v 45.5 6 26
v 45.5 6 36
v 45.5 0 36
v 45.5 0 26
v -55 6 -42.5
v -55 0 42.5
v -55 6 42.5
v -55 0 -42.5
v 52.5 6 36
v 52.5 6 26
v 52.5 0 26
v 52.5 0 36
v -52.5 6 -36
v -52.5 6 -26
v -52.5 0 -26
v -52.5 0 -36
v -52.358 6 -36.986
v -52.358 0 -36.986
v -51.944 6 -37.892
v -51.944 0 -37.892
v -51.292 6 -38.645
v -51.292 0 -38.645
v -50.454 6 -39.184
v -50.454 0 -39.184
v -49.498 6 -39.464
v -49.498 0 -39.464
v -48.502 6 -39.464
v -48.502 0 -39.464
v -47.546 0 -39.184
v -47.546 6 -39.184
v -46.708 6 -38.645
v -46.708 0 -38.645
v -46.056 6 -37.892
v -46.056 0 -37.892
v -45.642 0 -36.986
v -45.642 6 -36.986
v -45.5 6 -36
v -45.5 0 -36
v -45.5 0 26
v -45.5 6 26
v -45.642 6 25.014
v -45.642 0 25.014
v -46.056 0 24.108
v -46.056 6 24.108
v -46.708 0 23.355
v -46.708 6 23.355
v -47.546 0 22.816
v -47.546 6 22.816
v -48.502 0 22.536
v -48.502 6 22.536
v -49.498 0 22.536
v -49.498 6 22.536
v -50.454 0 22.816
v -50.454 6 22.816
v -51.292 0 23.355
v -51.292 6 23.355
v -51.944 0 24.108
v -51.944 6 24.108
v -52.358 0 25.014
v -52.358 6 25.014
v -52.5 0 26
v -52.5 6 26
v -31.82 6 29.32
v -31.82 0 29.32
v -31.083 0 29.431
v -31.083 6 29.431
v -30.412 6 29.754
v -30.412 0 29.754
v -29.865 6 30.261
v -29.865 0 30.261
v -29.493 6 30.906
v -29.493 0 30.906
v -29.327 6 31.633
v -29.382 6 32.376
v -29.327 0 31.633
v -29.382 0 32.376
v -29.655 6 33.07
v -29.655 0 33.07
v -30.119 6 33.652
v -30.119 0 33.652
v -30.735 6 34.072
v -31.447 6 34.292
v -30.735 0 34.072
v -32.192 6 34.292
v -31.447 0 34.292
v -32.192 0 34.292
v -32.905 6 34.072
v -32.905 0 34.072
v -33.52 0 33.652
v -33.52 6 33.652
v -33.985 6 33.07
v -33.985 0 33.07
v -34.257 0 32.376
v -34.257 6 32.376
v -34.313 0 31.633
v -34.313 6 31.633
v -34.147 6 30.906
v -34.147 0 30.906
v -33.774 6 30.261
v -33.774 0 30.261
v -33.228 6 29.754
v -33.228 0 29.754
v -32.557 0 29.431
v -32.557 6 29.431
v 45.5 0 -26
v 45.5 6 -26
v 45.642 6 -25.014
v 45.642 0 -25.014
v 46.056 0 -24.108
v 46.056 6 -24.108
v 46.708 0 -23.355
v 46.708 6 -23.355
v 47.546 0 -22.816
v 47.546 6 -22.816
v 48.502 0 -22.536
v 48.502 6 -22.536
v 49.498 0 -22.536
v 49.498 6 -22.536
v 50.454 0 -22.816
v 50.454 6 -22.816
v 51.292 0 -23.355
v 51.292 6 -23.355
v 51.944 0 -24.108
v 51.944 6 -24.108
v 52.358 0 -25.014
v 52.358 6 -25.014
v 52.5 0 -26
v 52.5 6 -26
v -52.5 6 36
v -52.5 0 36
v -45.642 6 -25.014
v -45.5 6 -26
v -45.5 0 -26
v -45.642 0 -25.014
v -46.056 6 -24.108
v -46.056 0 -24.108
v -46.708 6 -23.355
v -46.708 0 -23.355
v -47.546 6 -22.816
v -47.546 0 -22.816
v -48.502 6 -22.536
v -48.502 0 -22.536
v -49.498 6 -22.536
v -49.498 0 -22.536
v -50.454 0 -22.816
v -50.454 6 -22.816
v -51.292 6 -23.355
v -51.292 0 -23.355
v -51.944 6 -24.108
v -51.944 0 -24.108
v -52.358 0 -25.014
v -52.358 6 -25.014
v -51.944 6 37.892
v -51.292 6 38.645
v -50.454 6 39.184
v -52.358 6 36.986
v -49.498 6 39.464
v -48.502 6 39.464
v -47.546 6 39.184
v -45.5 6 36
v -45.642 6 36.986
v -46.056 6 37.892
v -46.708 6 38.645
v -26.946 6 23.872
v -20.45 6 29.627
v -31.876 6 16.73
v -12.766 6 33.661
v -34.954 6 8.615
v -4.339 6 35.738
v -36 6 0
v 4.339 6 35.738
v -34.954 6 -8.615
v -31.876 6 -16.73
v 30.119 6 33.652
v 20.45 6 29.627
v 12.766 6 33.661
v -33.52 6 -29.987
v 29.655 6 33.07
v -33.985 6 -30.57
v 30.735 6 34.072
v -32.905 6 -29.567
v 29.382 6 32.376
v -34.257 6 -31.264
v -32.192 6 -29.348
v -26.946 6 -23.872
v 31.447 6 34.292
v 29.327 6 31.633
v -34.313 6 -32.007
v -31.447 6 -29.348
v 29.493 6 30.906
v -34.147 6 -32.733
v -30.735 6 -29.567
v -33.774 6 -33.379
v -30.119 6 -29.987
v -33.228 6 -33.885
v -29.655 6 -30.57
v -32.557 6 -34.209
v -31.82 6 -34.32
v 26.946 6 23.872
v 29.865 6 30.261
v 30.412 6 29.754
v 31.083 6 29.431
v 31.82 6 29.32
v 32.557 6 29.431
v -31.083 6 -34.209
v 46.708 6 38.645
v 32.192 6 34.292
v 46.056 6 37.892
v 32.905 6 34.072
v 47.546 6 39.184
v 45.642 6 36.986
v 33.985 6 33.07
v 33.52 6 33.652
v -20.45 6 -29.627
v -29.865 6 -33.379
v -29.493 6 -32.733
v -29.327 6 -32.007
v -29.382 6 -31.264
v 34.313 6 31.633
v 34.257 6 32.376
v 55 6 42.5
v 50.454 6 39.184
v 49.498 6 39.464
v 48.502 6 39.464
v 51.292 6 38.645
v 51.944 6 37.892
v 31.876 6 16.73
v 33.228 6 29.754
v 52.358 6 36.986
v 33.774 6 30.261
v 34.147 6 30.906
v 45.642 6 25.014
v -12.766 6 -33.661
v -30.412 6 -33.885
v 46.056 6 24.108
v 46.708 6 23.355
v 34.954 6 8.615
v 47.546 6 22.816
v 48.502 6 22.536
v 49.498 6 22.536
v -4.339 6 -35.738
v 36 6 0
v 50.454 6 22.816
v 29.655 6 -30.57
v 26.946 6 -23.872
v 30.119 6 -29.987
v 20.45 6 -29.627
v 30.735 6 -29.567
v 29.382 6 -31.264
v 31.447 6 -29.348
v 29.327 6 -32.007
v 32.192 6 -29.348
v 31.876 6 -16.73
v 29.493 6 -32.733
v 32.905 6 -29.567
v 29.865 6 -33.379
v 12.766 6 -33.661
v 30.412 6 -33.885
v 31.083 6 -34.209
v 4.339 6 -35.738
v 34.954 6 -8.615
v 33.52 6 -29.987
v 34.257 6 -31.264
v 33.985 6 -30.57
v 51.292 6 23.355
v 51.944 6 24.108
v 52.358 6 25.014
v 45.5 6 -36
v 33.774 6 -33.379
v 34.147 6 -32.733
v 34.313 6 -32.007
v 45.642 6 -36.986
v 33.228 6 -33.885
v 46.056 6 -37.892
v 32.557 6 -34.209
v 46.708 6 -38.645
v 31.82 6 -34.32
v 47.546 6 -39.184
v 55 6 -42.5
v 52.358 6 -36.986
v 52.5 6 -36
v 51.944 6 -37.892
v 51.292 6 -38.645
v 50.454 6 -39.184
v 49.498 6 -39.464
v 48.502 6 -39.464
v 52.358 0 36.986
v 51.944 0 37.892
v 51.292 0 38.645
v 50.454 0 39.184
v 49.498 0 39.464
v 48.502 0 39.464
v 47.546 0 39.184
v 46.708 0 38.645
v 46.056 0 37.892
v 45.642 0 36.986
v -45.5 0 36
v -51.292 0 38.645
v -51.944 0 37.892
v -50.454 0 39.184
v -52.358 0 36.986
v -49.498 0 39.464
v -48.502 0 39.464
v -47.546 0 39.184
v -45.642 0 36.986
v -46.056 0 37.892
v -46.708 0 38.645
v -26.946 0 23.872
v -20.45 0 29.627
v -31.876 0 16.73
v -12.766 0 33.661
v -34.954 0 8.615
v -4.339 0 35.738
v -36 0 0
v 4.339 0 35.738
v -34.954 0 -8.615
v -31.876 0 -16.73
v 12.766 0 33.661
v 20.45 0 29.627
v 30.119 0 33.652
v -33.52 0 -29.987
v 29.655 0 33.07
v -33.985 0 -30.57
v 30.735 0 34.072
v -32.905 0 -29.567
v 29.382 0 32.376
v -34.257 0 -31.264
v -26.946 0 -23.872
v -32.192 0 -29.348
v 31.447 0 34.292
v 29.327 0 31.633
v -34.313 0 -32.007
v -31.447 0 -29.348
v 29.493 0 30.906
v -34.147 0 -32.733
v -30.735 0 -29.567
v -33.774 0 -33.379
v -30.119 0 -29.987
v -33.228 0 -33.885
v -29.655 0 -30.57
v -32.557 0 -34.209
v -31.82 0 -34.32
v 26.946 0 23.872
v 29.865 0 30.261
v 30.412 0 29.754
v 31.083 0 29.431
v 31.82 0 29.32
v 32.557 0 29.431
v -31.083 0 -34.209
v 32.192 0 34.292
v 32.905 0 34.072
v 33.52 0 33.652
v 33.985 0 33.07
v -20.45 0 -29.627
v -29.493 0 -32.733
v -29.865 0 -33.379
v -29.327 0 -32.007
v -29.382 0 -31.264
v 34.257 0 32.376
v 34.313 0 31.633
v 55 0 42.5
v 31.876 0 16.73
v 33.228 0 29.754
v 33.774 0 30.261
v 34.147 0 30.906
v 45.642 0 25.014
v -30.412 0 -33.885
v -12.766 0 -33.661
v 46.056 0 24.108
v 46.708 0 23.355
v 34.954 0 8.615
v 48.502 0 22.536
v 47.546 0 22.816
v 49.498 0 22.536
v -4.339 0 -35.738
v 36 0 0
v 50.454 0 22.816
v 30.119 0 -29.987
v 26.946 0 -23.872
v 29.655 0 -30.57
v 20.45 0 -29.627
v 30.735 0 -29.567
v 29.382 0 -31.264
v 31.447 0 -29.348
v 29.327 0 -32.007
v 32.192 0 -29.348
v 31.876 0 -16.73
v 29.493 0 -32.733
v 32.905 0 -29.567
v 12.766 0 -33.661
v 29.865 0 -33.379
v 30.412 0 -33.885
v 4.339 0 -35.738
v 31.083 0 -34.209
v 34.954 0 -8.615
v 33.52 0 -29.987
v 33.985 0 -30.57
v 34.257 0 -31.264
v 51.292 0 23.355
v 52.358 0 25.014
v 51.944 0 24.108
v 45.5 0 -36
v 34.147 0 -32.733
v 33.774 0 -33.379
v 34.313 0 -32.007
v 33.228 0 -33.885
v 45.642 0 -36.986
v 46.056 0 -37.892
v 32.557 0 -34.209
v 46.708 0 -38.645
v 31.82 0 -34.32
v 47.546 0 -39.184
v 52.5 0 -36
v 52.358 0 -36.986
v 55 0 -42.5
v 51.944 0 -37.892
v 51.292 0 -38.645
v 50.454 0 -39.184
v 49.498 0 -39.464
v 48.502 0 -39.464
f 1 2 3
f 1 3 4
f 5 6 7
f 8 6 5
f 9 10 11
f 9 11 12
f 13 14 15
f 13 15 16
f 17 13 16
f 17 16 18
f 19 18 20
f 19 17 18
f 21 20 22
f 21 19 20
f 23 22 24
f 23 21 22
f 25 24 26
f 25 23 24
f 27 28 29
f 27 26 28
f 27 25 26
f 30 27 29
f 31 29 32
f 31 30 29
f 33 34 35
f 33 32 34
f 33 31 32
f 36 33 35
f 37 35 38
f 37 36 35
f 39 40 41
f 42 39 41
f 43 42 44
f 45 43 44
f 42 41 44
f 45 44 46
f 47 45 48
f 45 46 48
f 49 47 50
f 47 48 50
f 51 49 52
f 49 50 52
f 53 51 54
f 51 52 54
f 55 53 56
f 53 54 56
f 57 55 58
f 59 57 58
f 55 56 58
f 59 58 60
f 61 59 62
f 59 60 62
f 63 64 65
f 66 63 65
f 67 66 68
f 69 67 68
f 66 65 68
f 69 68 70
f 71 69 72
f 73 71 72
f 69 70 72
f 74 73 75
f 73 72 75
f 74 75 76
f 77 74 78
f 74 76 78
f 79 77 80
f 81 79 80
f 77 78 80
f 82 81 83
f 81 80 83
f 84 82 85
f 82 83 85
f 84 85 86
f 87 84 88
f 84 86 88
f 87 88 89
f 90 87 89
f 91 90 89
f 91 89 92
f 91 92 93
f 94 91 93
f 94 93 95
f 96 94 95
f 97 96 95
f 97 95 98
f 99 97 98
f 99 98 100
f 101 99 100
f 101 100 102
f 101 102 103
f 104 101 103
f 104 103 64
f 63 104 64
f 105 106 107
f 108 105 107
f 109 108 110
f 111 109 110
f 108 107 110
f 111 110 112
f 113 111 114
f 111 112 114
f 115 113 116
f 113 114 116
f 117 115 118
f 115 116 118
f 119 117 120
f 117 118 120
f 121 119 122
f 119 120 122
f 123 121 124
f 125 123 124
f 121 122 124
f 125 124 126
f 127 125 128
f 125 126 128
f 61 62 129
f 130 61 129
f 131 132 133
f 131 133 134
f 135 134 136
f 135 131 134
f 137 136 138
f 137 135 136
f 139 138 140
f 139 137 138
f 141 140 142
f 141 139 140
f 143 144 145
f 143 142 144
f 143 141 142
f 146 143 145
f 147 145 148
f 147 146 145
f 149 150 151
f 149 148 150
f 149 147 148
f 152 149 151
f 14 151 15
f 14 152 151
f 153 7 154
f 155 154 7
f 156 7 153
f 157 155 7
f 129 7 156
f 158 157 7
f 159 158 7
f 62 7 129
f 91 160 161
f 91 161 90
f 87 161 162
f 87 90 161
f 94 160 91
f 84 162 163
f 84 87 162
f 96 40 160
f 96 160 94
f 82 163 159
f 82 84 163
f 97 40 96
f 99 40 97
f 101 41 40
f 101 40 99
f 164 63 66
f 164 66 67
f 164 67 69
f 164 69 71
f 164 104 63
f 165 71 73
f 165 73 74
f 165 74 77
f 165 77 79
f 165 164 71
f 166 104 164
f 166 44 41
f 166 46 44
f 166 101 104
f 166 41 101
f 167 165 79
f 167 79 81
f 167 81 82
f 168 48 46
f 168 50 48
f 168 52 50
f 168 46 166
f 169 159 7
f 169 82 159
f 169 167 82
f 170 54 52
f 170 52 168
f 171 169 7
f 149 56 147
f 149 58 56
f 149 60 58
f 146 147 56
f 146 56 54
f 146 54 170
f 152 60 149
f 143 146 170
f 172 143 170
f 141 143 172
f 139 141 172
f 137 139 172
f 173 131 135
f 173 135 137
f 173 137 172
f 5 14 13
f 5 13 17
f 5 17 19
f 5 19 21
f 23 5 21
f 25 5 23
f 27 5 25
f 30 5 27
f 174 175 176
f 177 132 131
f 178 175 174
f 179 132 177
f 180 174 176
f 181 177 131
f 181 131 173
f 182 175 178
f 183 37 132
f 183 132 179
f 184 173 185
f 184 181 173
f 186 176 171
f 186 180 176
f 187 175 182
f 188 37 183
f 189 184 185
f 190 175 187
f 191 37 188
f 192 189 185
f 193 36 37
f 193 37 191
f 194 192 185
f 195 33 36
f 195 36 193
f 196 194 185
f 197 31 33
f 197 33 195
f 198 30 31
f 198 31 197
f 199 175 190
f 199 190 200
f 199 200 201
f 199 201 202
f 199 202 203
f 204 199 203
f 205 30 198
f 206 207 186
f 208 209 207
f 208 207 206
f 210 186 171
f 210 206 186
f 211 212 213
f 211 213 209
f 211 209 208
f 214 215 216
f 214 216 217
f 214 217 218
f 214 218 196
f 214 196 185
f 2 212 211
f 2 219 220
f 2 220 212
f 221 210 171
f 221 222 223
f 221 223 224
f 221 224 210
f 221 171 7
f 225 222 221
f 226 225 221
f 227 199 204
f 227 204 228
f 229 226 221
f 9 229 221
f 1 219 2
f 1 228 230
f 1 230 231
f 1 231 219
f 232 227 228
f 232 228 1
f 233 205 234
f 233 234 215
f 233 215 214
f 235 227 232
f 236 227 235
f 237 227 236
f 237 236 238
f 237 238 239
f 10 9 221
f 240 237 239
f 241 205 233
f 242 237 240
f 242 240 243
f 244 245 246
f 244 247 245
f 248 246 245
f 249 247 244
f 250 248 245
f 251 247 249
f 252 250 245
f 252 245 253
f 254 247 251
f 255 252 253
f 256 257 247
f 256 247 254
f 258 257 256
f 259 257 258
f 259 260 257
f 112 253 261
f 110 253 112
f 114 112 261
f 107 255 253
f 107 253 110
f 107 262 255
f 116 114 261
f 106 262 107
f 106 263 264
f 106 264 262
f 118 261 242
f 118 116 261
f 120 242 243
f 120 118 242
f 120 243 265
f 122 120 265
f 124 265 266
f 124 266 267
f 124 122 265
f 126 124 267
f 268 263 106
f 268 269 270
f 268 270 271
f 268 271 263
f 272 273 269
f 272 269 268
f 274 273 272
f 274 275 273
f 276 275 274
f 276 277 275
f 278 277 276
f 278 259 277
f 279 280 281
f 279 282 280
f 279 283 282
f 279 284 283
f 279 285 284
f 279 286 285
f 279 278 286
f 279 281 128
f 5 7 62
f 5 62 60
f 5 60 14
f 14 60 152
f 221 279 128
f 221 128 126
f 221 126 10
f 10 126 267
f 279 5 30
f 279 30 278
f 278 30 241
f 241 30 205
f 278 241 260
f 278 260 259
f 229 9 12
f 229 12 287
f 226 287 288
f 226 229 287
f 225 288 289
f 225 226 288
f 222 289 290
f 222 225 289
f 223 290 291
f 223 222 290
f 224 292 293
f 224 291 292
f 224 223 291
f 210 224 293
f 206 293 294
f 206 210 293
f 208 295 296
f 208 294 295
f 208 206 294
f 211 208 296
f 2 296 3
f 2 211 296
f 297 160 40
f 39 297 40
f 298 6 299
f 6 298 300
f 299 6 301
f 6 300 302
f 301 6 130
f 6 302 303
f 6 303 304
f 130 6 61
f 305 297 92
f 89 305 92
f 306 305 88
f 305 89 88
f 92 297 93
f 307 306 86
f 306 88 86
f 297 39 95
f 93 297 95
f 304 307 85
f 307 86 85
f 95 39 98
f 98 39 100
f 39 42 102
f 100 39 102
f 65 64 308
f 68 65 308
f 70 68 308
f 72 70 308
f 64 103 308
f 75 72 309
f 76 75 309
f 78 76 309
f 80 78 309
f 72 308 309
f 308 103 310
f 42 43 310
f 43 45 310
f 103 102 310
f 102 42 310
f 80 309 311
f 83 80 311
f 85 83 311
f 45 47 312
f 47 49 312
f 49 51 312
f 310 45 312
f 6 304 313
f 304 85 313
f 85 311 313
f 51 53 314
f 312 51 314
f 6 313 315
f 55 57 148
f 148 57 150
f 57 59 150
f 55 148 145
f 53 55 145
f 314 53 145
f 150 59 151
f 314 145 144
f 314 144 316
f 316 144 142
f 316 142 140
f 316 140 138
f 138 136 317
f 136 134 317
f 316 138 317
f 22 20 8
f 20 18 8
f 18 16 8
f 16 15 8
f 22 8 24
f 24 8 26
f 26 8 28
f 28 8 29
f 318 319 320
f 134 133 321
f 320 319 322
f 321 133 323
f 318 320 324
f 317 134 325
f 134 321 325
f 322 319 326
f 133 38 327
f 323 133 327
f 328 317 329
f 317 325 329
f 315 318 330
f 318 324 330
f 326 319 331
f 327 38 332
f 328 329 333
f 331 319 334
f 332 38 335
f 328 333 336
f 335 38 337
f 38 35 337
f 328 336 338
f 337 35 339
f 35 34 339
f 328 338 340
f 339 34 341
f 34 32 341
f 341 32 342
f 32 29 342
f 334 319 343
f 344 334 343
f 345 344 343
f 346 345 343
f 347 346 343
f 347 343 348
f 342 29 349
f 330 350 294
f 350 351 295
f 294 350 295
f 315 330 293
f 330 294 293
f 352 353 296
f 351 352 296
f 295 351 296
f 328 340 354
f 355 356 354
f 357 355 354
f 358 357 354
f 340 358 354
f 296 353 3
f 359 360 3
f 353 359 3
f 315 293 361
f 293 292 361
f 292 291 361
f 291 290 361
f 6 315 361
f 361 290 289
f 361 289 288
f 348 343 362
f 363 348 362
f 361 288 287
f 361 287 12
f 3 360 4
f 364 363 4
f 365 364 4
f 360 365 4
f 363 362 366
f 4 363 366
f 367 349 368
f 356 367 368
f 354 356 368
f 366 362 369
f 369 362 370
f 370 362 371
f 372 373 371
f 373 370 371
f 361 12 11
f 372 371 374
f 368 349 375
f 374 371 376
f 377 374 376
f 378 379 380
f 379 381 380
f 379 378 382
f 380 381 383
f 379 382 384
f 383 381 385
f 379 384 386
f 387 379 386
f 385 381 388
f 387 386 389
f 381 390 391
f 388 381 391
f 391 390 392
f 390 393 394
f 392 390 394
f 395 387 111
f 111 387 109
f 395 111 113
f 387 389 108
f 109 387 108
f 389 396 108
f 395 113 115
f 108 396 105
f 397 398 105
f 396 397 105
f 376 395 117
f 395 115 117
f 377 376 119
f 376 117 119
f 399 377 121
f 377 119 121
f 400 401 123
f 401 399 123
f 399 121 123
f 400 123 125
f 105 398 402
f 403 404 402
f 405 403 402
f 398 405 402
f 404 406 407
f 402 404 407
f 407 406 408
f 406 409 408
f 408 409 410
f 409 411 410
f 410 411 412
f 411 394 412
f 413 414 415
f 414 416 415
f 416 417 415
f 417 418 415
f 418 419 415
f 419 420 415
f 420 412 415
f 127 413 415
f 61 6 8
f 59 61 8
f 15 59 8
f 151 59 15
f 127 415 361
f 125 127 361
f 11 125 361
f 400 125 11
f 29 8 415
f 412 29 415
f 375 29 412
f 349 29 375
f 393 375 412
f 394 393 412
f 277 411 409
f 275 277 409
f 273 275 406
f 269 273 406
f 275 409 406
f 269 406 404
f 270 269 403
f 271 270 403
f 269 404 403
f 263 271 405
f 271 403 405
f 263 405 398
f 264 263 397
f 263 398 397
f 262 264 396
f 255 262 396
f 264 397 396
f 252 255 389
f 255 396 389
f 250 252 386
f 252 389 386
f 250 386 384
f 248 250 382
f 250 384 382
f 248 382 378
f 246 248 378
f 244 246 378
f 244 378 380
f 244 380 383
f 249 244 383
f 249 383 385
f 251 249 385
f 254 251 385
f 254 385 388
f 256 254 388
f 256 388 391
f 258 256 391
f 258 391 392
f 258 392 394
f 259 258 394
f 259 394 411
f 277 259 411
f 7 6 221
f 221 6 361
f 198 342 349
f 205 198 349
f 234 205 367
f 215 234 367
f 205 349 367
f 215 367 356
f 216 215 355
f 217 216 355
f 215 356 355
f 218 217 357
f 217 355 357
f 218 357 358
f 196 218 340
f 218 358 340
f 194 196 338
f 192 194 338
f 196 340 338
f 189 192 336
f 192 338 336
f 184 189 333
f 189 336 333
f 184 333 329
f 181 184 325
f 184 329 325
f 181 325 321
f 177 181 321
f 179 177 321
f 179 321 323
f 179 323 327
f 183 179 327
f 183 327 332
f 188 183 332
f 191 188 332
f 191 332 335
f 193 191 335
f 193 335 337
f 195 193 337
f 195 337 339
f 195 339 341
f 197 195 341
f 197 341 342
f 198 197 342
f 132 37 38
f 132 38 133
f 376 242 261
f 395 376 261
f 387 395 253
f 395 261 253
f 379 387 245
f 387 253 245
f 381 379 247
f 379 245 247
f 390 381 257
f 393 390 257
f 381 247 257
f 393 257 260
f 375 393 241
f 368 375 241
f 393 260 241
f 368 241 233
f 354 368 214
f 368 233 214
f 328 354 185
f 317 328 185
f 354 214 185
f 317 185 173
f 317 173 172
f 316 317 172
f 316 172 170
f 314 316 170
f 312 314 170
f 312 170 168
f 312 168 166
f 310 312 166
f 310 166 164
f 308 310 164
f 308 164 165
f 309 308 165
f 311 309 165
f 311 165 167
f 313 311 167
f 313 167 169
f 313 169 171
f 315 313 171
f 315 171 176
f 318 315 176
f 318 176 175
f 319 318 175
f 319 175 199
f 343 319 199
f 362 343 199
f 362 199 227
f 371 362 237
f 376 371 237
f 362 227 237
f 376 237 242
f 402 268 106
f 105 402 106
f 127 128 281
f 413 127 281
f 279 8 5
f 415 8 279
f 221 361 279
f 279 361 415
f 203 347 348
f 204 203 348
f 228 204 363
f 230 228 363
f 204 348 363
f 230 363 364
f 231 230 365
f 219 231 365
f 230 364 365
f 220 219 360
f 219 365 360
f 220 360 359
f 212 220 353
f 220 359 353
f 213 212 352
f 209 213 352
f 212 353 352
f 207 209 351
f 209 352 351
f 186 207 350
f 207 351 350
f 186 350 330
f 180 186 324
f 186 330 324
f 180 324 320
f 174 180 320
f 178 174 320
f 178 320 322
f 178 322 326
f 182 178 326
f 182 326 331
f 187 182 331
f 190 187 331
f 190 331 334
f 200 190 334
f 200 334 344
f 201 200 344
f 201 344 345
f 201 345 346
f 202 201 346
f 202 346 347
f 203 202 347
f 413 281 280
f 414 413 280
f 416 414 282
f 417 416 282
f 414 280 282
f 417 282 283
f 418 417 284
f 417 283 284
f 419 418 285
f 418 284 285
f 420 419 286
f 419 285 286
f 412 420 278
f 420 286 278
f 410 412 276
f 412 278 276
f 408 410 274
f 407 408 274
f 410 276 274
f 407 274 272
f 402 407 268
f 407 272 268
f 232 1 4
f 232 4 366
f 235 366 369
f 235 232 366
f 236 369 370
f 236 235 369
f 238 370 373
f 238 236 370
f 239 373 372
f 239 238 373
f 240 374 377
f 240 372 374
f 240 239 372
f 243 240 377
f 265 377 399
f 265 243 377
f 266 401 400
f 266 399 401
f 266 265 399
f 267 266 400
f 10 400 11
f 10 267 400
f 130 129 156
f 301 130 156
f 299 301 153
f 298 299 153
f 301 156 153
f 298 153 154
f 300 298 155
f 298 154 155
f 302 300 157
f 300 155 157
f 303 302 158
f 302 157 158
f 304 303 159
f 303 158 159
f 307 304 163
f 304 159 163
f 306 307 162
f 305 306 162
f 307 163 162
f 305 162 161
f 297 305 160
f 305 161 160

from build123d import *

# Parameters (mm, degrees)
SKETCH_1_W             = 110
SKETCH_1_H             = 85
EXTRUDE_1_DEPTH        = 6
SKETCH_2_R             = 36
CUT_EXTRUDE_1_DEPTH    = 10
CUT_EXTRUDE_2_DEPTH    = 10
HOLE_WIZARD_M6_1_D     = 5
HOLE_WIZARD_M6_1_DEPTH = 15
HOLE_WIZARD_M6_1_TIP   = 1.502151548


with BuildPart() as part:
    # 草图1 → 凸台-拉伸1 (new body)
    with BuildSketch(Plane(origin=(0, 0, 0), x_dir=(1, 0, 0), z_dir=(0, 1, 0))):
        Rectangle(SKETCH_1_W, SKETCH_1_H)
    extrude(amount=EXTRUDE_1_DEPTH)

    # 草图2 → 切除-拉伸1 (cut)
    with BuildSketch(Plane(origin=(0, 6, 0), x_dir=(1, 0, 0), z_dir=(0, 1, 0))):
        Circle(SKETCH_2_R)
    extrude(amount=-CUT_EXTRUDE_1_DEPTH, mode=Mode.SUBTRACT)

    # 草图3 → 切除-拉伸2 (cut)
    with BuildSketch(Plane(origin=(0, 6, 0), x_dir=(1, 0, 0), z_dir=(0, 1, 0))):
        with BuildLine():
            Line((-45.5, 36), (-45.5, 26))
            ThreePointArc((-45.5, 26), (-49, 22.5), (-52.5, 26))
            Line((-52.5, 26), (-52.5, 36))
            ThreePointArc((-52.5, 36), (-49, 39.5), (-45.5, 36))
        make_face()
        with BuildLine():
            Line((45.5, 36), (45.5, 26))
            ThreePointArc((45.5, 26), (49, 22.5), (52.5, 26))
            Line((52.5, 26), (52.5, 36))
            ThreePointArc((52.5, 36), (49, 39.5), (45.5, 36))
        make_face()
        with BuildLine():
            Line((-45.5, -36), (-45.5, -26))
            ThreePointArc((-45.5, -26), (-49, -22.5), (-52.5, -26))
            Line((-52.5, -26), (-52.5, -36))
            ThreePointArc((-52.5, -36), (-49, -39.5), (-45.5, -36))
        make_face()
        with BuildLine():
            Line((45.5, -36), (45.5, -26))
            ThreePointArc((45.5, -26), (49, -22.5), (52.5, -26))
            Line((52.5, -26), (52.5, -36))
            ThreePointArc((52.5, -36), (49, -39.5), (45.5, -36))
        make_face()
    extrude(amount=-CUT_EXTRUDE_2_DEPTH, mode=Mode.SUBTRACT)

    # M6 螺纹孔1
    with Locations(Plane(origin=(-31.819805153, 6, -31.819805153), x_dir=(0, 0, 1), z_dir=(0, 1, 0))):
        with Locations((0, 0), (0, 63.639610306), (63.639610306, 63.639610306), (63.639610306, 0)):
            Hole(HOLE_WIZARD_M6_1_D / 2, depth=HOLE_WIZARD_M6_1_DEPTH)
            with Locations((0, 0, -(HOLE_WIZARD_M6_1_DEPTH + HOLE_WIZARD_M6_1_TIP / 2))):  # 118° drill point
                Cone(0, HOLE_WIZARD_M6_1_D / 2, HOLE_WIZARD_M6_1_TIP, mode=Mode.SUBTRACT)


solid = part.part
